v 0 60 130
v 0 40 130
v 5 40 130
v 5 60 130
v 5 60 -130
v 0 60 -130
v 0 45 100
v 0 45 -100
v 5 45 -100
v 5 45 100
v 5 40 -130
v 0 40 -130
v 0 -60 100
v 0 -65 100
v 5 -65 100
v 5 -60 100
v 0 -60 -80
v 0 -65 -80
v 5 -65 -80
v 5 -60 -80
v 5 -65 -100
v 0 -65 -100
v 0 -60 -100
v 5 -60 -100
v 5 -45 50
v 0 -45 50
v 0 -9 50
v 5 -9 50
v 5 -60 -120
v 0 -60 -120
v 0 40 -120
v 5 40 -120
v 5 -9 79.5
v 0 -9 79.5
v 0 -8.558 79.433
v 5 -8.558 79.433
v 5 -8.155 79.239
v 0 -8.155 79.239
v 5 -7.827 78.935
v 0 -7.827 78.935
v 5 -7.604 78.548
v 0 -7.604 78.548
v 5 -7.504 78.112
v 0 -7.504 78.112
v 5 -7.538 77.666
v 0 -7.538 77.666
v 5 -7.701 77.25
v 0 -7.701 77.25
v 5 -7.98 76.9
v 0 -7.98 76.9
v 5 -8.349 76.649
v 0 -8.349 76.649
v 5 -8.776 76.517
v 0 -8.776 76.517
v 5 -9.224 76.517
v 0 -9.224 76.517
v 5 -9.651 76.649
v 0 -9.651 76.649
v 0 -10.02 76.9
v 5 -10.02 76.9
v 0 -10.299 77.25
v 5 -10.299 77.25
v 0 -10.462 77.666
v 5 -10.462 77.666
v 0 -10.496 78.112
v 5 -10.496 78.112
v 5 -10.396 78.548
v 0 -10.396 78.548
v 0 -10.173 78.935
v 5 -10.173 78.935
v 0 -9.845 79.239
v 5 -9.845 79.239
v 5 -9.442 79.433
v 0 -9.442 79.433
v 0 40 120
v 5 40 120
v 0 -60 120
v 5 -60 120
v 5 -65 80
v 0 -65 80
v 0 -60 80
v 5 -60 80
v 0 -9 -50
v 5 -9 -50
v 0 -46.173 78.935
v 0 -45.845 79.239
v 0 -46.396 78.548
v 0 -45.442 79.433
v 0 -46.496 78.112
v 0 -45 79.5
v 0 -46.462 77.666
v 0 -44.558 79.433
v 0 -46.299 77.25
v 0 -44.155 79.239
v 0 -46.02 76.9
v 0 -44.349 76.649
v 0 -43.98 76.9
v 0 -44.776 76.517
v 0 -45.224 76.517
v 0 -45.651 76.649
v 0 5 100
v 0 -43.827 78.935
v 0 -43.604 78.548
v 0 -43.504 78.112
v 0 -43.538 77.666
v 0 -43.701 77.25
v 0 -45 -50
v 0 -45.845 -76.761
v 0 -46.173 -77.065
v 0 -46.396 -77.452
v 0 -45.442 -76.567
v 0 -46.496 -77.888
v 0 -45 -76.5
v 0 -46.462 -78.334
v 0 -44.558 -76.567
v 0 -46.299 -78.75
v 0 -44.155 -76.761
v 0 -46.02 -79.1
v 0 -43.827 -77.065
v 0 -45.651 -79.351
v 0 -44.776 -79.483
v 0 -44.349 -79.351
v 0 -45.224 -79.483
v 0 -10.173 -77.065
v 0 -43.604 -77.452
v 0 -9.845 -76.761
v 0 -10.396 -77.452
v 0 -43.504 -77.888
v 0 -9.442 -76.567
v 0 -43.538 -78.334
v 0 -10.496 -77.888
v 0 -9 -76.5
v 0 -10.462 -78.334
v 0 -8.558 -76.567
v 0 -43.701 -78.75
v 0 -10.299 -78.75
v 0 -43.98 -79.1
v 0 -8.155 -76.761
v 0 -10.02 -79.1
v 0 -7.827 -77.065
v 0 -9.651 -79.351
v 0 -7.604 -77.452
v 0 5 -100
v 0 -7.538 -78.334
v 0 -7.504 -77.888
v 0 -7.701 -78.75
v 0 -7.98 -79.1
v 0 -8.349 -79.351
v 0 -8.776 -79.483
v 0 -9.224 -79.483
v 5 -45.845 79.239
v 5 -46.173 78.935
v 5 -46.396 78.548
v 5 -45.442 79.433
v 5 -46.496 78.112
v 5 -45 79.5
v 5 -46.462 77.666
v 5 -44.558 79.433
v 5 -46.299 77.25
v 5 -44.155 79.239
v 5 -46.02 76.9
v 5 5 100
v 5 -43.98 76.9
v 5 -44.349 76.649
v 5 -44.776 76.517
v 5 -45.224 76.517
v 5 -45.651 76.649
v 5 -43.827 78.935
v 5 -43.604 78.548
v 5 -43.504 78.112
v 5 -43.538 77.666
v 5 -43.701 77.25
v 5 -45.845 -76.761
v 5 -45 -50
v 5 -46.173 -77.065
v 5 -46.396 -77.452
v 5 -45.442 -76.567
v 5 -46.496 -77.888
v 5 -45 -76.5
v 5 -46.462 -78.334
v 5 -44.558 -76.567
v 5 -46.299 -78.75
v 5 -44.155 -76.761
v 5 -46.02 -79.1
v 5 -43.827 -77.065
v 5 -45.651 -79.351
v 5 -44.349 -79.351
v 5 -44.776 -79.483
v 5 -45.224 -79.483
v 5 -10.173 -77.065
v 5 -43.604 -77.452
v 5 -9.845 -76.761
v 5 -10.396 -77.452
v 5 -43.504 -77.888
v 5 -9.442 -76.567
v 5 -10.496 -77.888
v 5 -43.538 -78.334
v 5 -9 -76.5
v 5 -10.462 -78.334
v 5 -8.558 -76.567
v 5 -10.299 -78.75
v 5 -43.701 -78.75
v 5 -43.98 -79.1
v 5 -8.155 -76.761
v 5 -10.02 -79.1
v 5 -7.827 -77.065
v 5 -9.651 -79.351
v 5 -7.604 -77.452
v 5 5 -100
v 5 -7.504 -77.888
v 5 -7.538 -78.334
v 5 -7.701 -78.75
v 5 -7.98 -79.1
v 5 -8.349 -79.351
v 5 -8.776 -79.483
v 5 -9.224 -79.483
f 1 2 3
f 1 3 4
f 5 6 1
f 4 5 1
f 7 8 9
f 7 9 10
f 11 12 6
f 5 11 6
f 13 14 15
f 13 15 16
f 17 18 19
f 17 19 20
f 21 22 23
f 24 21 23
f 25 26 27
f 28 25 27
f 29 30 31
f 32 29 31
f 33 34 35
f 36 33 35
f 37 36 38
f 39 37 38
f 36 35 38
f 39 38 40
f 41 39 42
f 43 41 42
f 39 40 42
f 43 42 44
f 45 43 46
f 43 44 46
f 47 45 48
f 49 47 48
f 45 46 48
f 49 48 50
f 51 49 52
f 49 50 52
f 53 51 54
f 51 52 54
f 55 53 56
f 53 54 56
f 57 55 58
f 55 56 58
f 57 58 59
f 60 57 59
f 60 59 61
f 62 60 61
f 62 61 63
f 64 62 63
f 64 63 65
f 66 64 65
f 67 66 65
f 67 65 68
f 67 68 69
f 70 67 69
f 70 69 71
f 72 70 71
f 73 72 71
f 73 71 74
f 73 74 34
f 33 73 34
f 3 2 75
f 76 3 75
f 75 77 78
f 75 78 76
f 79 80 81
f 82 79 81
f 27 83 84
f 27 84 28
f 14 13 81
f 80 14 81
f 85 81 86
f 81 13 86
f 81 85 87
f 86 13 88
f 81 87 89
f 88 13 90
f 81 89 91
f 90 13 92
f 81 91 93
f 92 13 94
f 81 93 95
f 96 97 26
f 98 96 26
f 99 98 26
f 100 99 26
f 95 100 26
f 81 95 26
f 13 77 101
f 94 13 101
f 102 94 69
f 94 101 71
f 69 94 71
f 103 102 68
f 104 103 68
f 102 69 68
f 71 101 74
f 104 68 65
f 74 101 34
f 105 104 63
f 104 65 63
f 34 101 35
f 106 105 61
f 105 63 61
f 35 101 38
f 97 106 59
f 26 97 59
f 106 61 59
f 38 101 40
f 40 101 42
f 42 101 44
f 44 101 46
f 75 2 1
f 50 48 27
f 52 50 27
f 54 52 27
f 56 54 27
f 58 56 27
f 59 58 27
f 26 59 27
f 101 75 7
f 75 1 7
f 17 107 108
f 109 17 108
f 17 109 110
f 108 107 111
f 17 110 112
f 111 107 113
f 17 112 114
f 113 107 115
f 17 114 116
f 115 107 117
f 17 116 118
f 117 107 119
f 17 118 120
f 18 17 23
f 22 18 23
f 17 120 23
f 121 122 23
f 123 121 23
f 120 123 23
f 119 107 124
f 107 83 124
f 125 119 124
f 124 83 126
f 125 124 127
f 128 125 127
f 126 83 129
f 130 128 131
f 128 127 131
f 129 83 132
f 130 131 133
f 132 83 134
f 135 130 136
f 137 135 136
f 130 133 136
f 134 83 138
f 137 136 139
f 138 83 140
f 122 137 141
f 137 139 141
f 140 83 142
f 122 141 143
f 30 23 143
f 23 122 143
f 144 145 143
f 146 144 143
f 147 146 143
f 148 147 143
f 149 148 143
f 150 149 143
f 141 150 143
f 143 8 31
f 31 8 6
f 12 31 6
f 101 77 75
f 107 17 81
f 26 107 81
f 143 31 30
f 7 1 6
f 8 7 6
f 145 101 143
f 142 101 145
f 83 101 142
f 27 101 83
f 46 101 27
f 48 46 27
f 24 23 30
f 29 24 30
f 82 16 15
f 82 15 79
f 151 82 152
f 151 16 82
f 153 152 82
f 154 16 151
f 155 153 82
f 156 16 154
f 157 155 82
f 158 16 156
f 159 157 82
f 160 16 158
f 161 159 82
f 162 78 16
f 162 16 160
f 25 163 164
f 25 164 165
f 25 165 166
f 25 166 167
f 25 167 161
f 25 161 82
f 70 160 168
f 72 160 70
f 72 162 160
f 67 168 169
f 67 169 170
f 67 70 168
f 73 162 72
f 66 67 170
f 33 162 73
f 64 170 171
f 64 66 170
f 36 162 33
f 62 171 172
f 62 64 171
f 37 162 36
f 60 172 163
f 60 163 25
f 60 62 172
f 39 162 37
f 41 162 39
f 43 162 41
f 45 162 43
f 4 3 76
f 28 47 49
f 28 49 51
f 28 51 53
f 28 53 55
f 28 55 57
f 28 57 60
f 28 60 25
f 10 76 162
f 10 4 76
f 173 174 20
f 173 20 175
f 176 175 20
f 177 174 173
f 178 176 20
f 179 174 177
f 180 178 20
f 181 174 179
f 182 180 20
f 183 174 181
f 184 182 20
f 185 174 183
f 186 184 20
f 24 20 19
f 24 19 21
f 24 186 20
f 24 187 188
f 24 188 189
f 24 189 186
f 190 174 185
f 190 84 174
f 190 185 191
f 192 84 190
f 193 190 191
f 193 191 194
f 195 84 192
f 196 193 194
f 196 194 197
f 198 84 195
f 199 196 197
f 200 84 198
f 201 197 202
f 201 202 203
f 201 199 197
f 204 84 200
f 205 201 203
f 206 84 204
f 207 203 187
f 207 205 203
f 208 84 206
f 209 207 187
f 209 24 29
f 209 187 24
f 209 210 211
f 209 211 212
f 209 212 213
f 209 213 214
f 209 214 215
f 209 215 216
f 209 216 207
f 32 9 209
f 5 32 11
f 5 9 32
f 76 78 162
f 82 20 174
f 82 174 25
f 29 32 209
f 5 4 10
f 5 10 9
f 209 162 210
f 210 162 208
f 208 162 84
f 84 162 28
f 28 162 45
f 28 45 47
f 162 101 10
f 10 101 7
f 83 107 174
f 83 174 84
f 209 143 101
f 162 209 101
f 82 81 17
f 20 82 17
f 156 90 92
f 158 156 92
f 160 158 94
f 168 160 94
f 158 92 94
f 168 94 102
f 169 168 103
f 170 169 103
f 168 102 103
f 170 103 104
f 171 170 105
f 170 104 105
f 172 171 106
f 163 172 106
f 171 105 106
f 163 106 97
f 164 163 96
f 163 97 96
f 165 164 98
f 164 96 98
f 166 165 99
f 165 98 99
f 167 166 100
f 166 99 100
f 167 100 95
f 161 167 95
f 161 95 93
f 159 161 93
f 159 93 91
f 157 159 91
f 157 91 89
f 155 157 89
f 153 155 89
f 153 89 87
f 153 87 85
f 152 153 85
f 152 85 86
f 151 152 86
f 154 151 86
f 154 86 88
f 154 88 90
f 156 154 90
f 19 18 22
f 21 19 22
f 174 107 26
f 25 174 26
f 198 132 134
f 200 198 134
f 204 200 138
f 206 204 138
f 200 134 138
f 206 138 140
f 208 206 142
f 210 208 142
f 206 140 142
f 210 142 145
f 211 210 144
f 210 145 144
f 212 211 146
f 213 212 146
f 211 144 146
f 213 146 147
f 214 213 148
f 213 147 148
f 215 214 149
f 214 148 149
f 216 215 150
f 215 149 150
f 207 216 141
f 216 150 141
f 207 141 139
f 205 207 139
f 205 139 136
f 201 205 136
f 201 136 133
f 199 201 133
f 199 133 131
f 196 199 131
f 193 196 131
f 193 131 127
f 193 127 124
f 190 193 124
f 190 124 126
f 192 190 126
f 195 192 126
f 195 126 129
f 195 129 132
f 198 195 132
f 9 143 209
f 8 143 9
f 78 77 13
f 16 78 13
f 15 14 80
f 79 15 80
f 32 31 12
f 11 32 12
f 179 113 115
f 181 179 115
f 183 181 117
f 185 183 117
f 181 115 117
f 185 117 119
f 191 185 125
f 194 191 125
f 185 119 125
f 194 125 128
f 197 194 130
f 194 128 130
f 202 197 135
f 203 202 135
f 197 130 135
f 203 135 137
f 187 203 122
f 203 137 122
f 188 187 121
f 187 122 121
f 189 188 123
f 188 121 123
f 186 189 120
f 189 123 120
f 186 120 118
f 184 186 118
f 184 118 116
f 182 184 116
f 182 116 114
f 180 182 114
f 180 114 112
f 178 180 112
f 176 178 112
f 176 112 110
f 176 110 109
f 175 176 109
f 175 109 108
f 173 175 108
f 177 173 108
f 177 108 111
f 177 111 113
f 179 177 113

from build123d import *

# Parameters (mm, degrees)
SKIZZE2_W                       = 240
SKIZZE2_H                       = 120
SKIZZE2_W_2                     = 10
SKIZZE2_H_2                     = 20
SKIZZE2_W_3                     = 20
SKIZZE2_H_3                     = 5
AUFSATZ_LINEAR_AUSTRAGEN1_DEPTH = 5
SKIZZE3_R                       = 1.5
SKIZZE3_W                       = 100
SKIZZE3_H                       = 36
SKIZZE3_W_2                     = 200
SKIZZE3_H_2                     = 40
SCHNITT_LINEAR_AUSTRAGEN1_DEPTH = 146.430395722


with BuildPart() as part:
    # Skizze2 → Aufsatz-Linear austragen1 (new body)
    with BuildSketch(Plane(origin=(0, 0, 0), x_dir=(0, 0, -1), z_dir=(1, 0, 0))):
        Rectangle(SKIZZE2_W, SKIZZE2_H)
        with Locations((-125, 50)):
            Rectangle(SKIZZE2_W_2, SKIZZE2_H_2)
        with Locations((125, 50)):
            Rectangle(SKIZZE2_W_2, SKIZZE2_H_2)
        with Locations((-90, -62.5)):
            Rectangle(SKIZZE2_W_3, SKIZZE2_H_3)
        with Locations((90, -62.5)):
            Rectangle(SKIZZE2_W_3, SKIZZE2_H_3)
    extrude(amount=AUFSATZ_LINEAR_AUSTRAGEN1_DEPTH)

    # Skizze3 → Schnitt-Linear austragen1 (cut, through all)
    with BuildSketch(Plane.ZY):
        with Locations((-78, -9)):
            Circle(SKIZZE3_R)
        with Locations((78, -45)):
            Circle(SKIZZE3_R)
        with Locations((-78, -45)):
            Circle(SKIZZE3_R)
        with Locations((78, -9)):
            Circle(SKIZZE3_R)
        with Locations((0, -27)):
            Rectangle(SKIZZE3_W, SKIZZE3_H)
        with Locations((0, 25)):
            Rectangle(SKIZZE3_W_2, SKIZZE3_H_2)
    extrude(amount=-SCHNITT_LINEAR_AUSTRAGEN1_DEPTH, mode=Mode.SUBTRACT)


solid = part.part
